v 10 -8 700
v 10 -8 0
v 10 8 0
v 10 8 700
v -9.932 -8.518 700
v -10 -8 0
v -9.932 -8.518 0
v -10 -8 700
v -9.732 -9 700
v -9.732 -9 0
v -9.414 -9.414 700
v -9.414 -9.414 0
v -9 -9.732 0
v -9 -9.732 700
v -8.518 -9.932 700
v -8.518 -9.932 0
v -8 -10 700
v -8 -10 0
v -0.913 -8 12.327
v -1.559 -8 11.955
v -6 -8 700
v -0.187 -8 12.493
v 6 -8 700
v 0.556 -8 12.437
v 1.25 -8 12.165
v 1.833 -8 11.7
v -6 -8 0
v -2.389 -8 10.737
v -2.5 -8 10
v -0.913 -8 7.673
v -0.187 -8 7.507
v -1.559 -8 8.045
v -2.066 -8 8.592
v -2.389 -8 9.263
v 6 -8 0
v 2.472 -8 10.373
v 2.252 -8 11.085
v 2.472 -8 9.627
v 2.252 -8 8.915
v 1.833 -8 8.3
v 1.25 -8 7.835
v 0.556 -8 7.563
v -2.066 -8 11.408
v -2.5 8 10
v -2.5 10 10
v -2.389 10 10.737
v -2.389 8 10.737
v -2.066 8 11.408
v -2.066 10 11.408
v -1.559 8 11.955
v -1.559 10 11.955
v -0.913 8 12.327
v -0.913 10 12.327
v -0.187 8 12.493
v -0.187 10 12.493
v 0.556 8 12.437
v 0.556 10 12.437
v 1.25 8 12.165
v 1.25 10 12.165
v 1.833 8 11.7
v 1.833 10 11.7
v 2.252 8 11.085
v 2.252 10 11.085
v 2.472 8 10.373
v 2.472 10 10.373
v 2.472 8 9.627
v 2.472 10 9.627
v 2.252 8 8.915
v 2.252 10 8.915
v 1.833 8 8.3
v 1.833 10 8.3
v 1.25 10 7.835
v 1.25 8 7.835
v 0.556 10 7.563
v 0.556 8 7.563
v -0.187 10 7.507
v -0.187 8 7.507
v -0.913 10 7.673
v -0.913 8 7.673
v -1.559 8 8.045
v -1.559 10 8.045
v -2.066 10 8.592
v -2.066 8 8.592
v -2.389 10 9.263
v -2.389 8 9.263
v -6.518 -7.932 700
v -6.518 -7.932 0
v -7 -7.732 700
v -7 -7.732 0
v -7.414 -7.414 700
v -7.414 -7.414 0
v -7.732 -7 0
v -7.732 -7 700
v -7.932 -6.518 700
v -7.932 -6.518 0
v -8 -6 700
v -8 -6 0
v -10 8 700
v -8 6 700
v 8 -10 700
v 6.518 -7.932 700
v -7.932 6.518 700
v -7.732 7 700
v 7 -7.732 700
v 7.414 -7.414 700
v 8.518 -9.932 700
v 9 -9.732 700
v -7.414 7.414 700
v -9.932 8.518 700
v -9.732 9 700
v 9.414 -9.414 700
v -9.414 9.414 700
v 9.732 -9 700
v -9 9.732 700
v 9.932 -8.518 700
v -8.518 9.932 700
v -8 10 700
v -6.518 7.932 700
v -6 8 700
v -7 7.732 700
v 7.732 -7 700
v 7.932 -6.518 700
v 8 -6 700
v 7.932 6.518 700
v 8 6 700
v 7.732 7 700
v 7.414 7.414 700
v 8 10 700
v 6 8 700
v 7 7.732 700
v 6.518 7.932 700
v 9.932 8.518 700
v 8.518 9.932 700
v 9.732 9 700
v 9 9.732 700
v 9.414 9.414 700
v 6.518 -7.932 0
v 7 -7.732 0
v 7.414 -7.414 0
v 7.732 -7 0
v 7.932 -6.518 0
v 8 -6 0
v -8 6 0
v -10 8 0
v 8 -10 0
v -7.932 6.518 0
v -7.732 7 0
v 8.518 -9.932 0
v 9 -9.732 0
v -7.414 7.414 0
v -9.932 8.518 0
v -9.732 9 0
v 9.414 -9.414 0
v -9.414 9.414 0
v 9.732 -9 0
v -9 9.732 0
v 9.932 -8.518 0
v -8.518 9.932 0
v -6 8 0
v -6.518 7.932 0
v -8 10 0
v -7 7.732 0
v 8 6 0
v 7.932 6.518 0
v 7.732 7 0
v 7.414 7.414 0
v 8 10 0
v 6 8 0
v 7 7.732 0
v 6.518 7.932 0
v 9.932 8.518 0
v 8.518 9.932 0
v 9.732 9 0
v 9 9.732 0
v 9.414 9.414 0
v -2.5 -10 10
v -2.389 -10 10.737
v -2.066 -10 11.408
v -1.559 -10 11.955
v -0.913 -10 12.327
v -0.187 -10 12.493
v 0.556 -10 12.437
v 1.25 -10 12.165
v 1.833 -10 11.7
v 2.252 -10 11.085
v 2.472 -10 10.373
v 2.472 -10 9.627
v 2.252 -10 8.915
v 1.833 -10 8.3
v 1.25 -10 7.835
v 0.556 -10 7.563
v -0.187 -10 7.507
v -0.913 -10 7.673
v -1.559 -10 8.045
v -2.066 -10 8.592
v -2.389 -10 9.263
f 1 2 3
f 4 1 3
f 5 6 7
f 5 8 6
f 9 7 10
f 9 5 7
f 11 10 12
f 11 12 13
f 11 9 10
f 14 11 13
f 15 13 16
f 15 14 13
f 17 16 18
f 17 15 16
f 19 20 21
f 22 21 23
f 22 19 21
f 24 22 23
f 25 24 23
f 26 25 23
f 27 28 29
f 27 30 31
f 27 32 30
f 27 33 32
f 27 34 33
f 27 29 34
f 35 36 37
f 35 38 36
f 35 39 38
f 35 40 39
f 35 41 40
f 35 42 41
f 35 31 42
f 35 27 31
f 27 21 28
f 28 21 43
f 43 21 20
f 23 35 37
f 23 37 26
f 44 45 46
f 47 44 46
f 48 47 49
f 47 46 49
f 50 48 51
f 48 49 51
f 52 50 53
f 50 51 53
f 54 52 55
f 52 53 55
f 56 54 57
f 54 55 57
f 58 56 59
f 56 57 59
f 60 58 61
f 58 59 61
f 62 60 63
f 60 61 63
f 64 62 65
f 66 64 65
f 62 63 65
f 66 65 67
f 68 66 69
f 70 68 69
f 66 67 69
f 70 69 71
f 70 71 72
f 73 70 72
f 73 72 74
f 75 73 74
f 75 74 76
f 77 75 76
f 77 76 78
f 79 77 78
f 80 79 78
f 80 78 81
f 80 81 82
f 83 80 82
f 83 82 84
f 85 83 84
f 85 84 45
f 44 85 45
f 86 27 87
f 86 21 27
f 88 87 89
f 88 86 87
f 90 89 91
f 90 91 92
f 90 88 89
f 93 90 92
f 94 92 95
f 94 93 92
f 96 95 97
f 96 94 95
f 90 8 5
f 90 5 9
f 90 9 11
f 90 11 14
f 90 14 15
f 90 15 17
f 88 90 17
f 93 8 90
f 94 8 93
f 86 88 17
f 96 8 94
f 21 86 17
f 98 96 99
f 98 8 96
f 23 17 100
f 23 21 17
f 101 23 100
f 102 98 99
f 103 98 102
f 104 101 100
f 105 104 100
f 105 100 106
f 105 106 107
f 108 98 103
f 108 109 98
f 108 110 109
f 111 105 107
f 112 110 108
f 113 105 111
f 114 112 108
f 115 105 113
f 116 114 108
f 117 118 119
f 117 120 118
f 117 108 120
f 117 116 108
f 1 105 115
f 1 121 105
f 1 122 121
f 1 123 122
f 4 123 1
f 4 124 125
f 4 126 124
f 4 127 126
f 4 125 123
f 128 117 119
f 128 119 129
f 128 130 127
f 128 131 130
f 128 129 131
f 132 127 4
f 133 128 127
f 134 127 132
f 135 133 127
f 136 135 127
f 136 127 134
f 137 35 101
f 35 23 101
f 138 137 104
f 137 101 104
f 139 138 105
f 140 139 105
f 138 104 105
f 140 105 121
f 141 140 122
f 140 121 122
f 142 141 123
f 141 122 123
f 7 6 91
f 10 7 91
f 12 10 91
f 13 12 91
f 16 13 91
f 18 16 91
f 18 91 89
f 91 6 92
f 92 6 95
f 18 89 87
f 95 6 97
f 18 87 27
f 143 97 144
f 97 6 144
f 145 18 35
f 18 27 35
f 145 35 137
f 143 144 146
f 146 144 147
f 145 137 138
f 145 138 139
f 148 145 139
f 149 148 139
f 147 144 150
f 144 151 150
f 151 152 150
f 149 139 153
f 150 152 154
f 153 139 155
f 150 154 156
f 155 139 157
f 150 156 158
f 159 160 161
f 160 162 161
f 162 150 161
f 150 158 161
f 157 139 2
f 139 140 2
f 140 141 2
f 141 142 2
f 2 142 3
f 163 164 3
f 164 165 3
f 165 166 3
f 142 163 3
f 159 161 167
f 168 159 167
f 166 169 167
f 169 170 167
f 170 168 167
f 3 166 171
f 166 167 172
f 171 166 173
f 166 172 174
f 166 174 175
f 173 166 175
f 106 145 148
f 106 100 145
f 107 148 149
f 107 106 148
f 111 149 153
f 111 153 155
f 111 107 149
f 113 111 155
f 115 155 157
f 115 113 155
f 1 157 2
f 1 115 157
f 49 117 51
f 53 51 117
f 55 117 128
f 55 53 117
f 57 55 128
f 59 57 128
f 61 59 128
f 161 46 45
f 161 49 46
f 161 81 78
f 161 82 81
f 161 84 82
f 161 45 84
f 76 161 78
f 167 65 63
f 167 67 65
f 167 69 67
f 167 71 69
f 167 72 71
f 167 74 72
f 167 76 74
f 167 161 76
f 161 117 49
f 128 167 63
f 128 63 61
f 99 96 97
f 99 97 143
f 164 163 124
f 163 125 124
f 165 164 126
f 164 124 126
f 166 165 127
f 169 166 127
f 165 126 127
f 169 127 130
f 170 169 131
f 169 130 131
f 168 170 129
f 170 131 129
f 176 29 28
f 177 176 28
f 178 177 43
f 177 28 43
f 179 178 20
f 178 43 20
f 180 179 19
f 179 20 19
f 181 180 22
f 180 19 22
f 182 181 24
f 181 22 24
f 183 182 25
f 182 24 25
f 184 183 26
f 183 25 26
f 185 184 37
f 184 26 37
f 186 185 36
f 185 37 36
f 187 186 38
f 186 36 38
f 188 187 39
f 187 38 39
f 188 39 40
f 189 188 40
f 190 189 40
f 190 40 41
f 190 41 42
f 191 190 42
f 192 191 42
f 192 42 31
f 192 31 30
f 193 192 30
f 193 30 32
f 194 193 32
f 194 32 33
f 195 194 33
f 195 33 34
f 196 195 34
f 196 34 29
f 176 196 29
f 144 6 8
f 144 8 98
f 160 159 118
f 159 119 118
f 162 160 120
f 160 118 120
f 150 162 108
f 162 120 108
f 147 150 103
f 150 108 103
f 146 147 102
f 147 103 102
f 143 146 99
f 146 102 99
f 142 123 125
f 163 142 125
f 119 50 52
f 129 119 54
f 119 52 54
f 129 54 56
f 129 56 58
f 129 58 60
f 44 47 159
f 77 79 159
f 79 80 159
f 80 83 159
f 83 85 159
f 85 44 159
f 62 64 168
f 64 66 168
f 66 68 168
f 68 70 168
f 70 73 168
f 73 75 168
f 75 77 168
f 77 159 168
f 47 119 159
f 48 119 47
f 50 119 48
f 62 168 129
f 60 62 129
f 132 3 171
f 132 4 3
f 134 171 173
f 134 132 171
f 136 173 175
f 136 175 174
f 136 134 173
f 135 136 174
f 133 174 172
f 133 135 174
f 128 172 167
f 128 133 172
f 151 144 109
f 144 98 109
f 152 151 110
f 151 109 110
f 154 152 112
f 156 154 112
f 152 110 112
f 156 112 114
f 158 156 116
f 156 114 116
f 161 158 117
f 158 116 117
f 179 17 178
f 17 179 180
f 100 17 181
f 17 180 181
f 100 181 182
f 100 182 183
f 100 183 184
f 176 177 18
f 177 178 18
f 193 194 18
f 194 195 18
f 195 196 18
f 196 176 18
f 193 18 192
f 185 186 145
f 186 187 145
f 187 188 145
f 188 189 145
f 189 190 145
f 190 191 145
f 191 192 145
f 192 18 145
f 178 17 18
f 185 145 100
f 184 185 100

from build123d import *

# Parameters (mm, degrees)
F0_W     = 20
F0_H     = 20
F1_DEPTH = 700
F2_R     = 2
F3_T     = 2
F4_R     = 2
F5_R     = 2.5
F6_DEPTH = 25.2


# Not quite as in the source:
# - a shell that OpenCascade refuses in one call is made with other operations: the cavity is built on its own and cut out


with BuildPart() as f1:
    # F0 (on Top) → F1 (new body)
    with BuildSketch(Plane.XY):
        Rectangle(F0_W, F0_H)
    extrude(amount=F1_DEPTH)

    # F2
    f2_edges = [f1.edges().sort_by_distance(p)[0] for p in [
        (-10, 10, 350),
        (-10, -10, 350),
        (10, -10, 350),
        (10, 10, 350),
    ]]
    fillet(f2_edges, radius=F2_R)

    # F3: shell of thickness 2, made by hand


with BuildPart() as f3_core1:
    # F3_t2: copy of F1
    add(f1.part)

    # the walls: a layer under each face that stays
    f3_faces = [f3_core1.faces().sort_by_distance(p)[0] for p in [
        (0, -10, 350),
        (-10, 0, 350),
        (10, 0, 350),
        (0, 10, 350),
    ]]
    thicken(f3_faces, amount=-F3_T, mode=Mode.SUBTRACT)


with BuildPart() as f1_1:
    add(f1.part)

    # what is left inside the walls is the cavity
    f3_cavity = [f3_core1.part.solids().sort_by_distance(p)[0] for p in [
        (-7.98, 0, 466.666667),
    ]]
    add(f3_cavity, mode=Mode.SUBTRACT)

    # F4
    f4_edges = [f1_1.edges().sort_by_distance(p)[0] for p in [
        (-8, 8, 350),
        (-8, -8, 350),
        (8, -8, 350),
        (8, 8, 350),
    ]]
    fillet(f4_edges, radius=F4_R)

    # F5 (on face) → F6 (cut)
    with BuildSketch(Plane(origin=(0, 10, 0), x_dir=(-1, 0, 0), z_dir=(0, 1, 0))):
        with Locations((0, 10)):
            Circle(F5_R)
    extrude(amount=-F6_DEPTH, mode=Mode.SUBTRACT)


solid = f1_1.part
